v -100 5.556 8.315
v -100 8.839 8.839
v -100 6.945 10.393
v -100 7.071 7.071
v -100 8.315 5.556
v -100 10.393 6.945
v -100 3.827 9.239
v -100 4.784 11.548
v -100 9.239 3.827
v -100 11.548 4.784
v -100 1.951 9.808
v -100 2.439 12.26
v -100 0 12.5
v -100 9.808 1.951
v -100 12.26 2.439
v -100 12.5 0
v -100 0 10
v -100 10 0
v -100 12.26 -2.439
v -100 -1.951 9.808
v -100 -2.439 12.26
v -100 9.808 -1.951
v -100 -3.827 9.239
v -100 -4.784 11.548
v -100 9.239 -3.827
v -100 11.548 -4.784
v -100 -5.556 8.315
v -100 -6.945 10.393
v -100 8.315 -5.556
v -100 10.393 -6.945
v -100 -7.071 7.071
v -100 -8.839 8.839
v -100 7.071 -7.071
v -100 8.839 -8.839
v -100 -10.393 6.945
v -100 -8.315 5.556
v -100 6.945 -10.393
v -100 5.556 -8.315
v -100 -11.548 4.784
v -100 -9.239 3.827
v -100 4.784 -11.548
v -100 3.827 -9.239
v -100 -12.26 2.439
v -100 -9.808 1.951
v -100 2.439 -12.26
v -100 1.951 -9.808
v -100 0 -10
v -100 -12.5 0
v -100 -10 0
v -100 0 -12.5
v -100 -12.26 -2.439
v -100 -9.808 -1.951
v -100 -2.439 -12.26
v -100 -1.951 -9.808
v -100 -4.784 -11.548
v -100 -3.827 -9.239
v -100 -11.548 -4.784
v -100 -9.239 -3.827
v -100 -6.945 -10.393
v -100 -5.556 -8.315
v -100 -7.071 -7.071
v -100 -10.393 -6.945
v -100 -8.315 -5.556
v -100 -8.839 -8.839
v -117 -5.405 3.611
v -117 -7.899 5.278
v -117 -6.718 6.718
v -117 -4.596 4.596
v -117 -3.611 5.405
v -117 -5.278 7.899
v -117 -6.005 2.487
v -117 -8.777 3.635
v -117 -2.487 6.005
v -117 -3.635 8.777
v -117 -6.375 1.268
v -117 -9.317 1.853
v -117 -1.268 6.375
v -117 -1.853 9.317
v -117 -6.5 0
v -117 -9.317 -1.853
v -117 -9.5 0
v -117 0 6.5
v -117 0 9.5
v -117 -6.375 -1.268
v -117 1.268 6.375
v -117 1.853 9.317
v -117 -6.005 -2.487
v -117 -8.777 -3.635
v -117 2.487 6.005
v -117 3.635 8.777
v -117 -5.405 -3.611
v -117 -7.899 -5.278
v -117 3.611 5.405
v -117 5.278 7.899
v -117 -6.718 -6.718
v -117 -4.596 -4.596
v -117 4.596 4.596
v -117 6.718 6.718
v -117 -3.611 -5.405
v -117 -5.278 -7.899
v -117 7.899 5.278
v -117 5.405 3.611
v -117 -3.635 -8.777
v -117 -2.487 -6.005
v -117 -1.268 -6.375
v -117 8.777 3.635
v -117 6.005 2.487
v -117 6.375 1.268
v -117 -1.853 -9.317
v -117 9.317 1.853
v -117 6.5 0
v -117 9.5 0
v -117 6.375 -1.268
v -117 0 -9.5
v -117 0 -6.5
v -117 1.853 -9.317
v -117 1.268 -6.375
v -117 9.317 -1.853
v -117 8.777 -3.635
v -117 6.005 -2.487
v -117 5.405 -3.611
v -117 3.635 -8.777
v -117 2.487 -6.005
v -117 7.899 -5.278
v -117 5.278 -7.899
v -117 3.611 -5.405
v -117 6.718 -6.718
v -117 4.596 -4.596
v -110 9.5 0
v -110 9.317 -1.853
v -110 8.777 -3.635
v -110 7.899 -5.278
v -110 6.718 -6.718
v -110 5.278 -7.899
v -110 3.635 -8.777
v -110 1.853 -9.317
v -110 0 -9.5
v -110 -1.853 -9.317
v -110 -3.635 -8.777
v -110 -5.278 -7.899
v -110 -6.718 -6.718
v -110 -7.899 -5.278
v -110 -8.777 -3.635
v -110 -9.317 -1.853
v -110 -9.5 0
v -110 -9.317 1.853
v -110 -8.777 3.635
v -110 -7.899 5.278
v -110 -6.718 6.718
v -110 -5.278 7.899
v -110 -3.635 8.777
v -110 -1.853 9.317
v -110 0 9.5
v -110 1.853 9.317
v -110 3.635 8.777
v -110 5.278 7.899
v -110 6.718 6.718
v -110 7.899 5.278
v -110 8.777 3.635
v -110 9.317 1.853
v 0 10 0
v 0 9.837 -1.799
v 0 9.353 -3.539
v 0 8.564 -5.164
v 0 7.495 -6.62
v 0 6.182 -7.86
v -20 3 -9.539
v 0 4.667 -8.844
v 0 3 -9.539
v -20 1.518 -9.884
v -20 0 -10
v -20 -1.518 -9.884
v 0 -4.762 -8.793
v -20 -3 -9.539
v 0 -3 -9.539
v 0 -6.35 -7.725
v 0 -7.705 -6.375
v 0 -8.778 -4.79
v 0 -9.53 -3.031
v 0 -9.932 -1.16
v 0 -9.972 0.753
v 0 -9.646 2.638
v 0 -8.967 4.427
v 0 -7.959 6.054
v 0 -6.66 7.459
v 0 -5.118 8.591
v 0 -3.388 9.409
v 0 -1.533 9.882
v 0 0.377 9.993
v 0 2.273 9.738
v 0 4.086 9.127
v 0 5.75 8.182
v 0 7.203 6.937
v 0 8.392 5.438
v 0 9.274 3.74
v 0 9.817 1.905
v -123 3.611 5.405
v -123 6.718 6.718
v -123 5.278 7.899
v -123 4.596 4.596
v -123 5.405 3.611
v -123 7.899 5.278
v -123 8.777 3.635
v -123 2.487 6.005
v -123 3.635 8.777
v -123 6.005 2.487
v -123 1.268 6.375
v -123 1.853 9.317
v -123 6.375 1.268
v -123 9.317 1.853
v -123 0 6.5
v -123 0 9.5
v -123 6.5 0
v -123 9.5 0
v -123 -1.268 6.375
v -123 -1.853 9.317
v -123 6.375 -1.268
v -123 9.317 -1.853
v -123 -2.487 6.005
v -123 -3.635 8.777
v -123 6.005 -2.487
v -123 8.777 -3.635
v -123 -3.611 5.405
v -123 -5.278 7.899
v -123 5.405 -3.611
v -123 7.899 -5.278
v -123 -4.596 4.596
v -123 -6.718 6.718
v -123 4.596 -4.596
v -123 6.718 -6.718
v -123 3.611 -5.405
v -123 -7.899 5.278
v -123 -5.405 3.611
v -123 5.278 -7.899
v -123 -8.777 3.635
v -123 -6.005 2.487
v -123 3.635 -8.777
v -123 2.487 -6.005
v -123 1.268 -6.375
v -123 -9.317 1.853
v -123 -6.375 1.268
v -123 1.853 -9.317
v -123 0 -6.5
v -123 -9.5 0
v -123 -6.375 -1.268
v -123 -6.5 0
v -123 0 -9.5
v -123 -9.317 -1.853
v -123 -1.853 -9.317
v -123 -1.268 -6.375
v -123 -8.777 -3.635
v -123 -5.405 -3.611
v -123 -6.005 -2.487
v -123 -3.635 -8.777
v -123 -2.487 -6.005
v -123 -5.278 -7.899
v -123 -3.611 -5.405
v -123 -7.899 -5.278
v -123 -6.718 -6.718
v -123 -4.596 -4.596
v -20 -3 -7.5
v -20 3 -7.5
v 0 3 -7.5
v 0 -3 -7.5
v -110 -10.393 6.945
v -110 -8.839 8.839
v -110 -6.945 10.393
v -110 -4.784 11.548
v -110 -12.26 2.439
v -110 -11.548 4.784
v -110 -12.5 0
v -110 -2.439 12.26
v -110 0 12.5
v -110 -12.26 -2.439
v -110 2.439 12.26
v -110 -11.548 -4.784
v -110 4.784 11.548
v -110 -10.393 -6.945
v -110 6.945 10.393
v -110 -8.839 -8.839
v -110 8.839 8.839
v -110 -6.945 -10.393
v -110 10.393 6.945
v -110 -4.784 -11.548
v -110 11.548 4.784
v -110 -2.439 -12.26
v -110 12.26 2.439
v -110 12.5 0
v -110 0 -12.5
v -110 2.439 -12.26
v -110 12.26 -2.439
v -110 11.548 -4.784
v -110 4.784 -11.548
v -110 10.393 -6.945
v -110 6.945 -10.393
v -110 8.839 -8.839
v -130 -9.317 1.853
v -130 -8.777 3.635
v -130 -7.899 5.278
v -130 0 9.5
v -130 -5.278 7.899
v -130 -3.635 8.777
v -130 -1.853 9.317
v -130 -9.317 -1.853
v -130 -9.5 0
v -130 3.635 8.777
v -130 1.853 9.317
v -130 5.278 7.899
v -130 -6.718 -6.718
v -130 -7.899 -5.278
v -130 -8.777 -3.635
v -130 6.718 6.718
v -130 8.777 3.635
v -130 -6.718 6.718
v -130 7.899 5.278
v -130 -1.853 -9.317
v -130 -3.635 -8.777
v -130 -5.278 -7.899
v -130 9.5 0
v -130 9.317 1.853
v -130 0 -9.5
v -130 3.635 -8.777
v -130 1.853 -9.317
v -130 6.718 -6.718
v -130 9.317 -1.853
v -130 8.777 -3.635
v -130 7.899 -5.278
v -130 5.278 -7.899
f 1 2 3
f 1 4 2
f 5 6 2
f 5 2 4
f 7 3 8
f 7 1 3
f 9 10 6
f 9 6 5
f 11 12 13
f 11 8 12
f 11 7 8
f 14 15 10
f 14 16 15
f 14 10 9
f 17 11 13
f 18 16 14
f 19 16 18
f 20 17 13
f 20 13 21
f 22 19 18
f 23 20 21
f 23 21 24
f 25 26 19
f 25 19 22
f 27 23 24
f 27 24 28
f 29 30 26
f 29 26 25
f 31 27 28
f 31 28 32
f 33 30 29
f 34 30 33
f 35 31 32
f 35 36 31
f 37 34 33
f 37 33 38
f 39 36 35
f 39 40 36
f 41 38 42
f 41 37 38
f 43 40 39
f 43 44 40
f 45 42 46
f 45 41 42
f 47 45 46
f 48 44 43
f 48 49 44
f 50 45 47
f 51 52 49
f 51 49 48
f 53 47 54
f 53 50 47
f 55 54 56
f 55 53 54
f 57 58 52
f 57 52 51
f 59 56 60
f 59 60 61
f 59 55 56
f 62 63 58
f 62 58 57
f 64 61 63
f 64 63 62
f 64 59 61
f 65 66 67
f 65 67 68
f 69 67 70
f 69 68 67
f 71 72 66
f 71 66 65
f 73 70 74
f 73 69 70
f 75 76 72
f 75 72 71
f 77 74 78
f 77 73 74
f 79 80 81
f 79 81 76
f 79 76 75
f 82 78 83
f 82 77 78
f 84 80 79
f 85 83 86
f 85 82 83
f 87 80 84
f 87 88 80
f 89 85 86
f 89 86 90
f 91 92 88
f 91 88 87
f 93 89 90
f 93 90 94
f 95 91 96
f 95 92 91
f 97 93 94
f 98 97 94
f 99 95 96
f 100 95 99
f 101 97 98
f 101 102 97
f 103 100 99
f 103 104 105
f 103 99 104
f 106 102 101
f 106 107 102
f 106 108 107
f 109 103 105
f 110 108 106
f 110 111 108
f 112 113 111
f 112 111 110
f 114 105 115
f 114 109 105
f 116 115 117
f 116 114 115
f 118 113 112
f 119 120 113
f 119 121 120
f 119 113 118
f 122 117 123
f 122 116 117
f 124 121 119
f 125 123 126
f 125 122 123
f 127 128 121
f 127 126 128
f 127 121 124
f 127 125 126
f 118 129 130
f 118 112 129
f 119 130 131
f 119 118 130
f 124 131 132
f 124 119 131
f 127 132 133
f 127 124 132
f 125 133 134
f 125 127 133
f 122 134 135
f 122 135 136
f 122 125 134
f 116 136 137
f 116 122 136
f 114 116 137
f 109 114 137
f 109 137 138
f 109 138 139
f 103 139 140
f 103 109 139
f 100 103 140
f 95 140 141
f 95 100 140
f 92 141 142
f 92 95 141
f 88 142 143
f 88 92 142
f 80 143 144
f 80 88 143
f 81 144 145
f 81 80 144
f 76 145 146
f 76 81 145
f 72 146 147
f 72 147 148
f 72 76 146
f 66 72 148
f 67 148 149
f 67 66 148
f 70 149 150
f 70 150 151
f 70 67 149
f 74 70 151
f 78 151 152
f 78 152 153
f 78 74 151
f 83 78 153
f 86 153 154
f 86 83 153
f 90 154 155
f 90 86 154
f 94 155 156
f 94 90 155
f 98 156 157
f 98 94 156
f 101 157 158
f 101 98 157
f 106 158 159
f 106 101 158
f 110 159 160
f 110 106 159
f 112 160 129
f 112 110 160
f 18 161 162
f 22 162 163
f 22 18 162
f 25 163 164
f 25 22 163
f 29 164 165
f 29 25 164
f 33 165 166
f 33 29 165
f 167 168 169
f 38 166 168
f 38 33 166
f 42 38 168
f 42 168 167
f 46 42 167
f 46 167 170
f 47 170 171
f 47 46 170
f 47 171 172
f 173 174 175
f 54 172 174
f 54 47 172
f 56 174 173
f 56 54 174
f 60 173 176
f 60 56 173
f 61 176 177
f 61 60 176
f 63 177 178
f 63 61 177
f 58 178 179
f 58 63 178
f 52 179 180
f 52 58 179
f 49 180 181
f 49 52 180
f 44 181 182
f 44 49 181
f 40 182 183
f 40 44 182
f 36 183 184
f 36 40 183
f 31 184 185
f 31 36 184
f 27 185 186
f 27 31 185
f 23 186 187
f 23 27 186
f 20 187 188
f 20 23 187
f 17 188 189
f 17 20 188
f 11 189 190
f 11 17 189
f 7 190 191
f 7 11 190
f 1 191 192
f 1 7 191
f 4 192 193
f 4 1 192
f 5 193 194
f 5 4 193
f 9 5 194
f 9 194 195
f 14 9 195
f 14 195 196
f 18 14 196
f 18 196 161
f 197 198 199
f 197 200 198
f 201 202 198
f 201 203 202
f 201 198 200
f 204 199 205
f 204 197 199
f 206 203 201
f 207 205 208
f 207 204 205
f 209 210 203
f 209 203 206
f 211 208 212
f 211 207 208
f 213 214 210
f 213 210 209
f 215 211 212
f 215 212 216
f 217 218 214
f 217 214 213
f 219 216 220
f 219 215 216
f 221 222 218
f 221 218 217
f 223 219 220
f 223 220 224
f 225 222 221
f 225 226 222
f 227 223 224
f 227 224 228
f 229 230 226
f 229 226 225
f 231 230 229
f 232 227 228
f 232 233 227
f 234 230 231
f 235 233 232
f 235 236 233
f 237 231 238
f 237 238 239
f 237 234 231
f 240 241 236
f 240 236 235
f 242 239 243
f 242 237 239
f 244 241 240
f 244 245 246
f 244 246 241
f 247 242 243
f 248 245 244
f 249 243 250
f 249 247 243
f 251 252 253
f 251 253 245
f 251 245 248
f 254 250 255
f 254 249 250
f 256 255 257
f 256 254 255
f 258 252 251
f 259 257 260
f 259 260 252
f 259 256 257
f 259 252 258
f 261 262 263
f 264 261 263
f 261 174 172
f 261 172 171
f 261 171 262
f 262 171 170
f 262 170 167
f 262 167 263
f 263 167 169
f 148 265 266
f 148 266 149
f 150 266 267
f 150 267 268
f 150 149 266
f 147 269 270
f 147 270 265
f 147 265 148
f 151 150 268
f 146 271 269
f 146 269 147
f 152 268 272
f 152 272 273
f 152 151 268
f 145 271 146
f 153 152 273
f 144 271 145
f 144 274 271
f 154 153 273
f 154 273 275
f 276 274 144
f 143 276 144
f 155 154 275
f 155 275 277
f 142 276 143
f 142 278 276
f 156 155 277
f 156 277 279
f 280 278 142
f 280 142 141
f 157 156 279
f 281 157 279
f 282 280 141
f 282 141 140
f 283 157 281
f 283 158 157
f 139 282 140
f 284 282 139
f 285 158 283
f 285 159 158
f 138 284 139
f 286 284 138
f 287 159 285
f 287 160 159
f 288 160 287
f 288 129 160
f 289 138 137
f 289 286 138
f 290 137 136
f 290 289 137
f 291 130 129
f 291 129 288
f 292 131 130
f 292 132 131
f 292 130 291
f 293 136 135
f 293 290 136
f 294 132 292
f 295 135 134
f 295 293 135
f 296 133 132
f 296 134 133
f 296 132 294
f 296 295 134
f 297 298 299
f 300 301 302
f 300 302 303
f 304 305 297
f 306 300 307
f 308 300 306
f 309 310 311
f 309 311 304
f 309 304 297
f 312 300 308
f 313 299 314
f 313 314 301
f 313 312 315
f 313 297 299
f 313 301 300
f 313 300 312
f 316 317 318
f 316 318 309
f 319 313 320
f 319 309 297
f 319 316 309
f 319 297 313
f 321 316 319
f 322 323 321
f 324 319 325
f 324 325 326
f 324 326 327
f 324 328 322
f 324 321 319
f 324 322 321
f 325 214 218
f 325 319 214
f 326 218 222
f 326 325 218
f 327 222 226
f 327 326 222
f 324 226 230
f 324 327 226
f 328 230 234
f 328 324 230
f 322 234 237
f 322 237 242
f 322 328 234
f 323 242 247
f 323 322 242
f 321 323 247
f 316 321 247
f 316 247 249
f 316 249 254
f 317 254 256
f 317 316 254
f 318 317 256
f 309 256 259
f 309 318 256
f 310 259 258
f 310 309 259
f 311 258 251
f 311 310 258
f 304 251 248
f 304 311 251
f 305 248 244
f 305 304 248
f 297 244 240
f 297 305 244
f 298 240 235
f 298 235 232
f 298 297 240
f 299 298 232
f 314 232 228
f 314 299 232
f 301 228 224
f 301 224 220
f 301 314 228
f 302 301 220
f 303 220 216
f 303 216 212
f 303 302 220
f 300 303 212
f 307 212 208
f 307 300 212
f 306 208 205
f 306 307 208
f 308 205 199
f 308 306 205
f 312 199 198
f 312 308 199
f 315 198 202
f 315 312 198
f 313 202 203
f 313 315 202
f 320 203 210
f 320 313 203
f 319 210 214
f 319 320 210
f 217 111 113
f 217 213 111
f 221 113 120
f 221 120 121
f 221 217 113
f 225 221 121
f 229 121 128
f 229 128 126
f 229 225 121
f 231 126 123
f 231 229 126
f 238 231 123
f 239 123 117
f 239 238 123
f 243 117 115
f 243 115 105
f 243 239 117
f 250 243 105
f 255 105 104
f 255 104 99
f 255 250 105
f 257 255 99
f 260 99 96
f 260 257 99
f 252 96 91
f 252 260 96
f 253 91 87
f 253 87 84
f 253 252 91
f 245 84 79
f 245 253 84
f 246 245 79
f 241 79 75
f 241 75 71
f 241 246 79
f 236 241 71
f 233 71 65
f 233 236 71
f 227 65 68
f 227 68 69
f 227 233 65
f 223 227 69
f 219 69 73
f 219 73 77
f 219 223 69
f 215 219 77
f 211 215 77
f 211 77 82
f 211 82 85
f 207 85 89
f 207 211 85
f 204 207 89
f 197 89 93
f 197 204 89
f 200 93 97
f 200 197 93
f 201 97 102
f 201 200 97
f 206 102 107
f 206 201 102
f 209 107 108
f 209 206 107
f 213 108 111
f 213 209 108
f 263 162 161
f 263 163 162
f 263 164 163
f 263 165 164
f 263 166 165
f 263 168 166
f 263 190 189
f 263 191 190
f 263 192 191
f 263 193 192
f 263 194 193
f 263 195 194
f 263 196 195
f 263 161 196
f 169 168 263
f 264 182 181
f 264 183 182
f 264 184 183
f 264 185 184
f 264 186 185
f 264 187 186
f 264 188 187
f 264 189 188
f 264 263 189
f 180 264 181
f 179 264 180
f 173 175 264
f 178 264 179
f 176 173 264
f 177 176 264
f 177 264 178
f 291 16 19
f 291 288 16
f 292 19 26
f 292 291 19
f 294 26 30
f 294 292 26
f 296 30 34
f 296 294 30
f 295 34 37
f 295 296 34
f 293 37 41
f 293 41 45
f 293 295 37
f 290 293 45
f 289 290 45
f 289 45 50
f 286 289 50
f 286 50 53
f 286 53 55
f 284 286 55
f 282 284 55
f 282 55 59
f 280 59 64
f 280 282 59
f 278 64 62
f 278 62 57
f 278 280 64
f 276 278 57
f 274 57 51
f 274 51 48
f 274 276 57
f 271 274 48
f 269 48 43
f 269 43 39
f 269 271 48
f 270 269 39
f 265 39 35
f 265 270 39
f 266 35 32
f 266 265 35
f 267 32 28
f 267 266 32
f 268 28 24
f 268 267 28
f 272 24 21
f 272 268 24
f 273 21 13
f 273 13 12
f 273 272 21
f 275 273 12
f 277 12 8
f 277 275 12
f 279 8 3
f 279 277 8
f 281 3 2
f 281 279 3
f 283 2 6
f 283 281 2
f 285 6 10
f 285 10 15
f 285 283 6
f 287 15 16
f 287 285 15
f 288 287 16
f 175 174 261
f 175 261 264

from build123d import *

# Parameters (mm, degrees)
IZIM2_W               = 20
IZIM2_H               = 6
KES_EKSTR_ZYON2_DEPTH = 2.5


with BuildPart() as part:
    # Çizim1 → Döndür1 (revolve)
    with BuildSketch(Plane.XY):
        Polygon((-100, 10), (-100, 12.5), (-110, 12.5), (-110, 9.5), (-117, 9.5), (-117, 6.5), (-123, 6.5), (-123, 9.5), (-130, 9.5), (-130, 0), (0, 0), (0, 10), align=None)
    revolve(axis=Axis((0, 0, 0), (-1, 0, 0)))

    # Çizim2 → Kes-Ekstrüzyon2 (cut)
    with BuildSketch(Plane.XY.offset(-10)):
        with Locations((-10, 0)):
            Rectangle(IZIM2_W, IZIM2_H)
    extrude(amount=KES_EKSTR_ZYON2_DEPTH, mode=Mode.SUBTRACT)


solid = part.part
